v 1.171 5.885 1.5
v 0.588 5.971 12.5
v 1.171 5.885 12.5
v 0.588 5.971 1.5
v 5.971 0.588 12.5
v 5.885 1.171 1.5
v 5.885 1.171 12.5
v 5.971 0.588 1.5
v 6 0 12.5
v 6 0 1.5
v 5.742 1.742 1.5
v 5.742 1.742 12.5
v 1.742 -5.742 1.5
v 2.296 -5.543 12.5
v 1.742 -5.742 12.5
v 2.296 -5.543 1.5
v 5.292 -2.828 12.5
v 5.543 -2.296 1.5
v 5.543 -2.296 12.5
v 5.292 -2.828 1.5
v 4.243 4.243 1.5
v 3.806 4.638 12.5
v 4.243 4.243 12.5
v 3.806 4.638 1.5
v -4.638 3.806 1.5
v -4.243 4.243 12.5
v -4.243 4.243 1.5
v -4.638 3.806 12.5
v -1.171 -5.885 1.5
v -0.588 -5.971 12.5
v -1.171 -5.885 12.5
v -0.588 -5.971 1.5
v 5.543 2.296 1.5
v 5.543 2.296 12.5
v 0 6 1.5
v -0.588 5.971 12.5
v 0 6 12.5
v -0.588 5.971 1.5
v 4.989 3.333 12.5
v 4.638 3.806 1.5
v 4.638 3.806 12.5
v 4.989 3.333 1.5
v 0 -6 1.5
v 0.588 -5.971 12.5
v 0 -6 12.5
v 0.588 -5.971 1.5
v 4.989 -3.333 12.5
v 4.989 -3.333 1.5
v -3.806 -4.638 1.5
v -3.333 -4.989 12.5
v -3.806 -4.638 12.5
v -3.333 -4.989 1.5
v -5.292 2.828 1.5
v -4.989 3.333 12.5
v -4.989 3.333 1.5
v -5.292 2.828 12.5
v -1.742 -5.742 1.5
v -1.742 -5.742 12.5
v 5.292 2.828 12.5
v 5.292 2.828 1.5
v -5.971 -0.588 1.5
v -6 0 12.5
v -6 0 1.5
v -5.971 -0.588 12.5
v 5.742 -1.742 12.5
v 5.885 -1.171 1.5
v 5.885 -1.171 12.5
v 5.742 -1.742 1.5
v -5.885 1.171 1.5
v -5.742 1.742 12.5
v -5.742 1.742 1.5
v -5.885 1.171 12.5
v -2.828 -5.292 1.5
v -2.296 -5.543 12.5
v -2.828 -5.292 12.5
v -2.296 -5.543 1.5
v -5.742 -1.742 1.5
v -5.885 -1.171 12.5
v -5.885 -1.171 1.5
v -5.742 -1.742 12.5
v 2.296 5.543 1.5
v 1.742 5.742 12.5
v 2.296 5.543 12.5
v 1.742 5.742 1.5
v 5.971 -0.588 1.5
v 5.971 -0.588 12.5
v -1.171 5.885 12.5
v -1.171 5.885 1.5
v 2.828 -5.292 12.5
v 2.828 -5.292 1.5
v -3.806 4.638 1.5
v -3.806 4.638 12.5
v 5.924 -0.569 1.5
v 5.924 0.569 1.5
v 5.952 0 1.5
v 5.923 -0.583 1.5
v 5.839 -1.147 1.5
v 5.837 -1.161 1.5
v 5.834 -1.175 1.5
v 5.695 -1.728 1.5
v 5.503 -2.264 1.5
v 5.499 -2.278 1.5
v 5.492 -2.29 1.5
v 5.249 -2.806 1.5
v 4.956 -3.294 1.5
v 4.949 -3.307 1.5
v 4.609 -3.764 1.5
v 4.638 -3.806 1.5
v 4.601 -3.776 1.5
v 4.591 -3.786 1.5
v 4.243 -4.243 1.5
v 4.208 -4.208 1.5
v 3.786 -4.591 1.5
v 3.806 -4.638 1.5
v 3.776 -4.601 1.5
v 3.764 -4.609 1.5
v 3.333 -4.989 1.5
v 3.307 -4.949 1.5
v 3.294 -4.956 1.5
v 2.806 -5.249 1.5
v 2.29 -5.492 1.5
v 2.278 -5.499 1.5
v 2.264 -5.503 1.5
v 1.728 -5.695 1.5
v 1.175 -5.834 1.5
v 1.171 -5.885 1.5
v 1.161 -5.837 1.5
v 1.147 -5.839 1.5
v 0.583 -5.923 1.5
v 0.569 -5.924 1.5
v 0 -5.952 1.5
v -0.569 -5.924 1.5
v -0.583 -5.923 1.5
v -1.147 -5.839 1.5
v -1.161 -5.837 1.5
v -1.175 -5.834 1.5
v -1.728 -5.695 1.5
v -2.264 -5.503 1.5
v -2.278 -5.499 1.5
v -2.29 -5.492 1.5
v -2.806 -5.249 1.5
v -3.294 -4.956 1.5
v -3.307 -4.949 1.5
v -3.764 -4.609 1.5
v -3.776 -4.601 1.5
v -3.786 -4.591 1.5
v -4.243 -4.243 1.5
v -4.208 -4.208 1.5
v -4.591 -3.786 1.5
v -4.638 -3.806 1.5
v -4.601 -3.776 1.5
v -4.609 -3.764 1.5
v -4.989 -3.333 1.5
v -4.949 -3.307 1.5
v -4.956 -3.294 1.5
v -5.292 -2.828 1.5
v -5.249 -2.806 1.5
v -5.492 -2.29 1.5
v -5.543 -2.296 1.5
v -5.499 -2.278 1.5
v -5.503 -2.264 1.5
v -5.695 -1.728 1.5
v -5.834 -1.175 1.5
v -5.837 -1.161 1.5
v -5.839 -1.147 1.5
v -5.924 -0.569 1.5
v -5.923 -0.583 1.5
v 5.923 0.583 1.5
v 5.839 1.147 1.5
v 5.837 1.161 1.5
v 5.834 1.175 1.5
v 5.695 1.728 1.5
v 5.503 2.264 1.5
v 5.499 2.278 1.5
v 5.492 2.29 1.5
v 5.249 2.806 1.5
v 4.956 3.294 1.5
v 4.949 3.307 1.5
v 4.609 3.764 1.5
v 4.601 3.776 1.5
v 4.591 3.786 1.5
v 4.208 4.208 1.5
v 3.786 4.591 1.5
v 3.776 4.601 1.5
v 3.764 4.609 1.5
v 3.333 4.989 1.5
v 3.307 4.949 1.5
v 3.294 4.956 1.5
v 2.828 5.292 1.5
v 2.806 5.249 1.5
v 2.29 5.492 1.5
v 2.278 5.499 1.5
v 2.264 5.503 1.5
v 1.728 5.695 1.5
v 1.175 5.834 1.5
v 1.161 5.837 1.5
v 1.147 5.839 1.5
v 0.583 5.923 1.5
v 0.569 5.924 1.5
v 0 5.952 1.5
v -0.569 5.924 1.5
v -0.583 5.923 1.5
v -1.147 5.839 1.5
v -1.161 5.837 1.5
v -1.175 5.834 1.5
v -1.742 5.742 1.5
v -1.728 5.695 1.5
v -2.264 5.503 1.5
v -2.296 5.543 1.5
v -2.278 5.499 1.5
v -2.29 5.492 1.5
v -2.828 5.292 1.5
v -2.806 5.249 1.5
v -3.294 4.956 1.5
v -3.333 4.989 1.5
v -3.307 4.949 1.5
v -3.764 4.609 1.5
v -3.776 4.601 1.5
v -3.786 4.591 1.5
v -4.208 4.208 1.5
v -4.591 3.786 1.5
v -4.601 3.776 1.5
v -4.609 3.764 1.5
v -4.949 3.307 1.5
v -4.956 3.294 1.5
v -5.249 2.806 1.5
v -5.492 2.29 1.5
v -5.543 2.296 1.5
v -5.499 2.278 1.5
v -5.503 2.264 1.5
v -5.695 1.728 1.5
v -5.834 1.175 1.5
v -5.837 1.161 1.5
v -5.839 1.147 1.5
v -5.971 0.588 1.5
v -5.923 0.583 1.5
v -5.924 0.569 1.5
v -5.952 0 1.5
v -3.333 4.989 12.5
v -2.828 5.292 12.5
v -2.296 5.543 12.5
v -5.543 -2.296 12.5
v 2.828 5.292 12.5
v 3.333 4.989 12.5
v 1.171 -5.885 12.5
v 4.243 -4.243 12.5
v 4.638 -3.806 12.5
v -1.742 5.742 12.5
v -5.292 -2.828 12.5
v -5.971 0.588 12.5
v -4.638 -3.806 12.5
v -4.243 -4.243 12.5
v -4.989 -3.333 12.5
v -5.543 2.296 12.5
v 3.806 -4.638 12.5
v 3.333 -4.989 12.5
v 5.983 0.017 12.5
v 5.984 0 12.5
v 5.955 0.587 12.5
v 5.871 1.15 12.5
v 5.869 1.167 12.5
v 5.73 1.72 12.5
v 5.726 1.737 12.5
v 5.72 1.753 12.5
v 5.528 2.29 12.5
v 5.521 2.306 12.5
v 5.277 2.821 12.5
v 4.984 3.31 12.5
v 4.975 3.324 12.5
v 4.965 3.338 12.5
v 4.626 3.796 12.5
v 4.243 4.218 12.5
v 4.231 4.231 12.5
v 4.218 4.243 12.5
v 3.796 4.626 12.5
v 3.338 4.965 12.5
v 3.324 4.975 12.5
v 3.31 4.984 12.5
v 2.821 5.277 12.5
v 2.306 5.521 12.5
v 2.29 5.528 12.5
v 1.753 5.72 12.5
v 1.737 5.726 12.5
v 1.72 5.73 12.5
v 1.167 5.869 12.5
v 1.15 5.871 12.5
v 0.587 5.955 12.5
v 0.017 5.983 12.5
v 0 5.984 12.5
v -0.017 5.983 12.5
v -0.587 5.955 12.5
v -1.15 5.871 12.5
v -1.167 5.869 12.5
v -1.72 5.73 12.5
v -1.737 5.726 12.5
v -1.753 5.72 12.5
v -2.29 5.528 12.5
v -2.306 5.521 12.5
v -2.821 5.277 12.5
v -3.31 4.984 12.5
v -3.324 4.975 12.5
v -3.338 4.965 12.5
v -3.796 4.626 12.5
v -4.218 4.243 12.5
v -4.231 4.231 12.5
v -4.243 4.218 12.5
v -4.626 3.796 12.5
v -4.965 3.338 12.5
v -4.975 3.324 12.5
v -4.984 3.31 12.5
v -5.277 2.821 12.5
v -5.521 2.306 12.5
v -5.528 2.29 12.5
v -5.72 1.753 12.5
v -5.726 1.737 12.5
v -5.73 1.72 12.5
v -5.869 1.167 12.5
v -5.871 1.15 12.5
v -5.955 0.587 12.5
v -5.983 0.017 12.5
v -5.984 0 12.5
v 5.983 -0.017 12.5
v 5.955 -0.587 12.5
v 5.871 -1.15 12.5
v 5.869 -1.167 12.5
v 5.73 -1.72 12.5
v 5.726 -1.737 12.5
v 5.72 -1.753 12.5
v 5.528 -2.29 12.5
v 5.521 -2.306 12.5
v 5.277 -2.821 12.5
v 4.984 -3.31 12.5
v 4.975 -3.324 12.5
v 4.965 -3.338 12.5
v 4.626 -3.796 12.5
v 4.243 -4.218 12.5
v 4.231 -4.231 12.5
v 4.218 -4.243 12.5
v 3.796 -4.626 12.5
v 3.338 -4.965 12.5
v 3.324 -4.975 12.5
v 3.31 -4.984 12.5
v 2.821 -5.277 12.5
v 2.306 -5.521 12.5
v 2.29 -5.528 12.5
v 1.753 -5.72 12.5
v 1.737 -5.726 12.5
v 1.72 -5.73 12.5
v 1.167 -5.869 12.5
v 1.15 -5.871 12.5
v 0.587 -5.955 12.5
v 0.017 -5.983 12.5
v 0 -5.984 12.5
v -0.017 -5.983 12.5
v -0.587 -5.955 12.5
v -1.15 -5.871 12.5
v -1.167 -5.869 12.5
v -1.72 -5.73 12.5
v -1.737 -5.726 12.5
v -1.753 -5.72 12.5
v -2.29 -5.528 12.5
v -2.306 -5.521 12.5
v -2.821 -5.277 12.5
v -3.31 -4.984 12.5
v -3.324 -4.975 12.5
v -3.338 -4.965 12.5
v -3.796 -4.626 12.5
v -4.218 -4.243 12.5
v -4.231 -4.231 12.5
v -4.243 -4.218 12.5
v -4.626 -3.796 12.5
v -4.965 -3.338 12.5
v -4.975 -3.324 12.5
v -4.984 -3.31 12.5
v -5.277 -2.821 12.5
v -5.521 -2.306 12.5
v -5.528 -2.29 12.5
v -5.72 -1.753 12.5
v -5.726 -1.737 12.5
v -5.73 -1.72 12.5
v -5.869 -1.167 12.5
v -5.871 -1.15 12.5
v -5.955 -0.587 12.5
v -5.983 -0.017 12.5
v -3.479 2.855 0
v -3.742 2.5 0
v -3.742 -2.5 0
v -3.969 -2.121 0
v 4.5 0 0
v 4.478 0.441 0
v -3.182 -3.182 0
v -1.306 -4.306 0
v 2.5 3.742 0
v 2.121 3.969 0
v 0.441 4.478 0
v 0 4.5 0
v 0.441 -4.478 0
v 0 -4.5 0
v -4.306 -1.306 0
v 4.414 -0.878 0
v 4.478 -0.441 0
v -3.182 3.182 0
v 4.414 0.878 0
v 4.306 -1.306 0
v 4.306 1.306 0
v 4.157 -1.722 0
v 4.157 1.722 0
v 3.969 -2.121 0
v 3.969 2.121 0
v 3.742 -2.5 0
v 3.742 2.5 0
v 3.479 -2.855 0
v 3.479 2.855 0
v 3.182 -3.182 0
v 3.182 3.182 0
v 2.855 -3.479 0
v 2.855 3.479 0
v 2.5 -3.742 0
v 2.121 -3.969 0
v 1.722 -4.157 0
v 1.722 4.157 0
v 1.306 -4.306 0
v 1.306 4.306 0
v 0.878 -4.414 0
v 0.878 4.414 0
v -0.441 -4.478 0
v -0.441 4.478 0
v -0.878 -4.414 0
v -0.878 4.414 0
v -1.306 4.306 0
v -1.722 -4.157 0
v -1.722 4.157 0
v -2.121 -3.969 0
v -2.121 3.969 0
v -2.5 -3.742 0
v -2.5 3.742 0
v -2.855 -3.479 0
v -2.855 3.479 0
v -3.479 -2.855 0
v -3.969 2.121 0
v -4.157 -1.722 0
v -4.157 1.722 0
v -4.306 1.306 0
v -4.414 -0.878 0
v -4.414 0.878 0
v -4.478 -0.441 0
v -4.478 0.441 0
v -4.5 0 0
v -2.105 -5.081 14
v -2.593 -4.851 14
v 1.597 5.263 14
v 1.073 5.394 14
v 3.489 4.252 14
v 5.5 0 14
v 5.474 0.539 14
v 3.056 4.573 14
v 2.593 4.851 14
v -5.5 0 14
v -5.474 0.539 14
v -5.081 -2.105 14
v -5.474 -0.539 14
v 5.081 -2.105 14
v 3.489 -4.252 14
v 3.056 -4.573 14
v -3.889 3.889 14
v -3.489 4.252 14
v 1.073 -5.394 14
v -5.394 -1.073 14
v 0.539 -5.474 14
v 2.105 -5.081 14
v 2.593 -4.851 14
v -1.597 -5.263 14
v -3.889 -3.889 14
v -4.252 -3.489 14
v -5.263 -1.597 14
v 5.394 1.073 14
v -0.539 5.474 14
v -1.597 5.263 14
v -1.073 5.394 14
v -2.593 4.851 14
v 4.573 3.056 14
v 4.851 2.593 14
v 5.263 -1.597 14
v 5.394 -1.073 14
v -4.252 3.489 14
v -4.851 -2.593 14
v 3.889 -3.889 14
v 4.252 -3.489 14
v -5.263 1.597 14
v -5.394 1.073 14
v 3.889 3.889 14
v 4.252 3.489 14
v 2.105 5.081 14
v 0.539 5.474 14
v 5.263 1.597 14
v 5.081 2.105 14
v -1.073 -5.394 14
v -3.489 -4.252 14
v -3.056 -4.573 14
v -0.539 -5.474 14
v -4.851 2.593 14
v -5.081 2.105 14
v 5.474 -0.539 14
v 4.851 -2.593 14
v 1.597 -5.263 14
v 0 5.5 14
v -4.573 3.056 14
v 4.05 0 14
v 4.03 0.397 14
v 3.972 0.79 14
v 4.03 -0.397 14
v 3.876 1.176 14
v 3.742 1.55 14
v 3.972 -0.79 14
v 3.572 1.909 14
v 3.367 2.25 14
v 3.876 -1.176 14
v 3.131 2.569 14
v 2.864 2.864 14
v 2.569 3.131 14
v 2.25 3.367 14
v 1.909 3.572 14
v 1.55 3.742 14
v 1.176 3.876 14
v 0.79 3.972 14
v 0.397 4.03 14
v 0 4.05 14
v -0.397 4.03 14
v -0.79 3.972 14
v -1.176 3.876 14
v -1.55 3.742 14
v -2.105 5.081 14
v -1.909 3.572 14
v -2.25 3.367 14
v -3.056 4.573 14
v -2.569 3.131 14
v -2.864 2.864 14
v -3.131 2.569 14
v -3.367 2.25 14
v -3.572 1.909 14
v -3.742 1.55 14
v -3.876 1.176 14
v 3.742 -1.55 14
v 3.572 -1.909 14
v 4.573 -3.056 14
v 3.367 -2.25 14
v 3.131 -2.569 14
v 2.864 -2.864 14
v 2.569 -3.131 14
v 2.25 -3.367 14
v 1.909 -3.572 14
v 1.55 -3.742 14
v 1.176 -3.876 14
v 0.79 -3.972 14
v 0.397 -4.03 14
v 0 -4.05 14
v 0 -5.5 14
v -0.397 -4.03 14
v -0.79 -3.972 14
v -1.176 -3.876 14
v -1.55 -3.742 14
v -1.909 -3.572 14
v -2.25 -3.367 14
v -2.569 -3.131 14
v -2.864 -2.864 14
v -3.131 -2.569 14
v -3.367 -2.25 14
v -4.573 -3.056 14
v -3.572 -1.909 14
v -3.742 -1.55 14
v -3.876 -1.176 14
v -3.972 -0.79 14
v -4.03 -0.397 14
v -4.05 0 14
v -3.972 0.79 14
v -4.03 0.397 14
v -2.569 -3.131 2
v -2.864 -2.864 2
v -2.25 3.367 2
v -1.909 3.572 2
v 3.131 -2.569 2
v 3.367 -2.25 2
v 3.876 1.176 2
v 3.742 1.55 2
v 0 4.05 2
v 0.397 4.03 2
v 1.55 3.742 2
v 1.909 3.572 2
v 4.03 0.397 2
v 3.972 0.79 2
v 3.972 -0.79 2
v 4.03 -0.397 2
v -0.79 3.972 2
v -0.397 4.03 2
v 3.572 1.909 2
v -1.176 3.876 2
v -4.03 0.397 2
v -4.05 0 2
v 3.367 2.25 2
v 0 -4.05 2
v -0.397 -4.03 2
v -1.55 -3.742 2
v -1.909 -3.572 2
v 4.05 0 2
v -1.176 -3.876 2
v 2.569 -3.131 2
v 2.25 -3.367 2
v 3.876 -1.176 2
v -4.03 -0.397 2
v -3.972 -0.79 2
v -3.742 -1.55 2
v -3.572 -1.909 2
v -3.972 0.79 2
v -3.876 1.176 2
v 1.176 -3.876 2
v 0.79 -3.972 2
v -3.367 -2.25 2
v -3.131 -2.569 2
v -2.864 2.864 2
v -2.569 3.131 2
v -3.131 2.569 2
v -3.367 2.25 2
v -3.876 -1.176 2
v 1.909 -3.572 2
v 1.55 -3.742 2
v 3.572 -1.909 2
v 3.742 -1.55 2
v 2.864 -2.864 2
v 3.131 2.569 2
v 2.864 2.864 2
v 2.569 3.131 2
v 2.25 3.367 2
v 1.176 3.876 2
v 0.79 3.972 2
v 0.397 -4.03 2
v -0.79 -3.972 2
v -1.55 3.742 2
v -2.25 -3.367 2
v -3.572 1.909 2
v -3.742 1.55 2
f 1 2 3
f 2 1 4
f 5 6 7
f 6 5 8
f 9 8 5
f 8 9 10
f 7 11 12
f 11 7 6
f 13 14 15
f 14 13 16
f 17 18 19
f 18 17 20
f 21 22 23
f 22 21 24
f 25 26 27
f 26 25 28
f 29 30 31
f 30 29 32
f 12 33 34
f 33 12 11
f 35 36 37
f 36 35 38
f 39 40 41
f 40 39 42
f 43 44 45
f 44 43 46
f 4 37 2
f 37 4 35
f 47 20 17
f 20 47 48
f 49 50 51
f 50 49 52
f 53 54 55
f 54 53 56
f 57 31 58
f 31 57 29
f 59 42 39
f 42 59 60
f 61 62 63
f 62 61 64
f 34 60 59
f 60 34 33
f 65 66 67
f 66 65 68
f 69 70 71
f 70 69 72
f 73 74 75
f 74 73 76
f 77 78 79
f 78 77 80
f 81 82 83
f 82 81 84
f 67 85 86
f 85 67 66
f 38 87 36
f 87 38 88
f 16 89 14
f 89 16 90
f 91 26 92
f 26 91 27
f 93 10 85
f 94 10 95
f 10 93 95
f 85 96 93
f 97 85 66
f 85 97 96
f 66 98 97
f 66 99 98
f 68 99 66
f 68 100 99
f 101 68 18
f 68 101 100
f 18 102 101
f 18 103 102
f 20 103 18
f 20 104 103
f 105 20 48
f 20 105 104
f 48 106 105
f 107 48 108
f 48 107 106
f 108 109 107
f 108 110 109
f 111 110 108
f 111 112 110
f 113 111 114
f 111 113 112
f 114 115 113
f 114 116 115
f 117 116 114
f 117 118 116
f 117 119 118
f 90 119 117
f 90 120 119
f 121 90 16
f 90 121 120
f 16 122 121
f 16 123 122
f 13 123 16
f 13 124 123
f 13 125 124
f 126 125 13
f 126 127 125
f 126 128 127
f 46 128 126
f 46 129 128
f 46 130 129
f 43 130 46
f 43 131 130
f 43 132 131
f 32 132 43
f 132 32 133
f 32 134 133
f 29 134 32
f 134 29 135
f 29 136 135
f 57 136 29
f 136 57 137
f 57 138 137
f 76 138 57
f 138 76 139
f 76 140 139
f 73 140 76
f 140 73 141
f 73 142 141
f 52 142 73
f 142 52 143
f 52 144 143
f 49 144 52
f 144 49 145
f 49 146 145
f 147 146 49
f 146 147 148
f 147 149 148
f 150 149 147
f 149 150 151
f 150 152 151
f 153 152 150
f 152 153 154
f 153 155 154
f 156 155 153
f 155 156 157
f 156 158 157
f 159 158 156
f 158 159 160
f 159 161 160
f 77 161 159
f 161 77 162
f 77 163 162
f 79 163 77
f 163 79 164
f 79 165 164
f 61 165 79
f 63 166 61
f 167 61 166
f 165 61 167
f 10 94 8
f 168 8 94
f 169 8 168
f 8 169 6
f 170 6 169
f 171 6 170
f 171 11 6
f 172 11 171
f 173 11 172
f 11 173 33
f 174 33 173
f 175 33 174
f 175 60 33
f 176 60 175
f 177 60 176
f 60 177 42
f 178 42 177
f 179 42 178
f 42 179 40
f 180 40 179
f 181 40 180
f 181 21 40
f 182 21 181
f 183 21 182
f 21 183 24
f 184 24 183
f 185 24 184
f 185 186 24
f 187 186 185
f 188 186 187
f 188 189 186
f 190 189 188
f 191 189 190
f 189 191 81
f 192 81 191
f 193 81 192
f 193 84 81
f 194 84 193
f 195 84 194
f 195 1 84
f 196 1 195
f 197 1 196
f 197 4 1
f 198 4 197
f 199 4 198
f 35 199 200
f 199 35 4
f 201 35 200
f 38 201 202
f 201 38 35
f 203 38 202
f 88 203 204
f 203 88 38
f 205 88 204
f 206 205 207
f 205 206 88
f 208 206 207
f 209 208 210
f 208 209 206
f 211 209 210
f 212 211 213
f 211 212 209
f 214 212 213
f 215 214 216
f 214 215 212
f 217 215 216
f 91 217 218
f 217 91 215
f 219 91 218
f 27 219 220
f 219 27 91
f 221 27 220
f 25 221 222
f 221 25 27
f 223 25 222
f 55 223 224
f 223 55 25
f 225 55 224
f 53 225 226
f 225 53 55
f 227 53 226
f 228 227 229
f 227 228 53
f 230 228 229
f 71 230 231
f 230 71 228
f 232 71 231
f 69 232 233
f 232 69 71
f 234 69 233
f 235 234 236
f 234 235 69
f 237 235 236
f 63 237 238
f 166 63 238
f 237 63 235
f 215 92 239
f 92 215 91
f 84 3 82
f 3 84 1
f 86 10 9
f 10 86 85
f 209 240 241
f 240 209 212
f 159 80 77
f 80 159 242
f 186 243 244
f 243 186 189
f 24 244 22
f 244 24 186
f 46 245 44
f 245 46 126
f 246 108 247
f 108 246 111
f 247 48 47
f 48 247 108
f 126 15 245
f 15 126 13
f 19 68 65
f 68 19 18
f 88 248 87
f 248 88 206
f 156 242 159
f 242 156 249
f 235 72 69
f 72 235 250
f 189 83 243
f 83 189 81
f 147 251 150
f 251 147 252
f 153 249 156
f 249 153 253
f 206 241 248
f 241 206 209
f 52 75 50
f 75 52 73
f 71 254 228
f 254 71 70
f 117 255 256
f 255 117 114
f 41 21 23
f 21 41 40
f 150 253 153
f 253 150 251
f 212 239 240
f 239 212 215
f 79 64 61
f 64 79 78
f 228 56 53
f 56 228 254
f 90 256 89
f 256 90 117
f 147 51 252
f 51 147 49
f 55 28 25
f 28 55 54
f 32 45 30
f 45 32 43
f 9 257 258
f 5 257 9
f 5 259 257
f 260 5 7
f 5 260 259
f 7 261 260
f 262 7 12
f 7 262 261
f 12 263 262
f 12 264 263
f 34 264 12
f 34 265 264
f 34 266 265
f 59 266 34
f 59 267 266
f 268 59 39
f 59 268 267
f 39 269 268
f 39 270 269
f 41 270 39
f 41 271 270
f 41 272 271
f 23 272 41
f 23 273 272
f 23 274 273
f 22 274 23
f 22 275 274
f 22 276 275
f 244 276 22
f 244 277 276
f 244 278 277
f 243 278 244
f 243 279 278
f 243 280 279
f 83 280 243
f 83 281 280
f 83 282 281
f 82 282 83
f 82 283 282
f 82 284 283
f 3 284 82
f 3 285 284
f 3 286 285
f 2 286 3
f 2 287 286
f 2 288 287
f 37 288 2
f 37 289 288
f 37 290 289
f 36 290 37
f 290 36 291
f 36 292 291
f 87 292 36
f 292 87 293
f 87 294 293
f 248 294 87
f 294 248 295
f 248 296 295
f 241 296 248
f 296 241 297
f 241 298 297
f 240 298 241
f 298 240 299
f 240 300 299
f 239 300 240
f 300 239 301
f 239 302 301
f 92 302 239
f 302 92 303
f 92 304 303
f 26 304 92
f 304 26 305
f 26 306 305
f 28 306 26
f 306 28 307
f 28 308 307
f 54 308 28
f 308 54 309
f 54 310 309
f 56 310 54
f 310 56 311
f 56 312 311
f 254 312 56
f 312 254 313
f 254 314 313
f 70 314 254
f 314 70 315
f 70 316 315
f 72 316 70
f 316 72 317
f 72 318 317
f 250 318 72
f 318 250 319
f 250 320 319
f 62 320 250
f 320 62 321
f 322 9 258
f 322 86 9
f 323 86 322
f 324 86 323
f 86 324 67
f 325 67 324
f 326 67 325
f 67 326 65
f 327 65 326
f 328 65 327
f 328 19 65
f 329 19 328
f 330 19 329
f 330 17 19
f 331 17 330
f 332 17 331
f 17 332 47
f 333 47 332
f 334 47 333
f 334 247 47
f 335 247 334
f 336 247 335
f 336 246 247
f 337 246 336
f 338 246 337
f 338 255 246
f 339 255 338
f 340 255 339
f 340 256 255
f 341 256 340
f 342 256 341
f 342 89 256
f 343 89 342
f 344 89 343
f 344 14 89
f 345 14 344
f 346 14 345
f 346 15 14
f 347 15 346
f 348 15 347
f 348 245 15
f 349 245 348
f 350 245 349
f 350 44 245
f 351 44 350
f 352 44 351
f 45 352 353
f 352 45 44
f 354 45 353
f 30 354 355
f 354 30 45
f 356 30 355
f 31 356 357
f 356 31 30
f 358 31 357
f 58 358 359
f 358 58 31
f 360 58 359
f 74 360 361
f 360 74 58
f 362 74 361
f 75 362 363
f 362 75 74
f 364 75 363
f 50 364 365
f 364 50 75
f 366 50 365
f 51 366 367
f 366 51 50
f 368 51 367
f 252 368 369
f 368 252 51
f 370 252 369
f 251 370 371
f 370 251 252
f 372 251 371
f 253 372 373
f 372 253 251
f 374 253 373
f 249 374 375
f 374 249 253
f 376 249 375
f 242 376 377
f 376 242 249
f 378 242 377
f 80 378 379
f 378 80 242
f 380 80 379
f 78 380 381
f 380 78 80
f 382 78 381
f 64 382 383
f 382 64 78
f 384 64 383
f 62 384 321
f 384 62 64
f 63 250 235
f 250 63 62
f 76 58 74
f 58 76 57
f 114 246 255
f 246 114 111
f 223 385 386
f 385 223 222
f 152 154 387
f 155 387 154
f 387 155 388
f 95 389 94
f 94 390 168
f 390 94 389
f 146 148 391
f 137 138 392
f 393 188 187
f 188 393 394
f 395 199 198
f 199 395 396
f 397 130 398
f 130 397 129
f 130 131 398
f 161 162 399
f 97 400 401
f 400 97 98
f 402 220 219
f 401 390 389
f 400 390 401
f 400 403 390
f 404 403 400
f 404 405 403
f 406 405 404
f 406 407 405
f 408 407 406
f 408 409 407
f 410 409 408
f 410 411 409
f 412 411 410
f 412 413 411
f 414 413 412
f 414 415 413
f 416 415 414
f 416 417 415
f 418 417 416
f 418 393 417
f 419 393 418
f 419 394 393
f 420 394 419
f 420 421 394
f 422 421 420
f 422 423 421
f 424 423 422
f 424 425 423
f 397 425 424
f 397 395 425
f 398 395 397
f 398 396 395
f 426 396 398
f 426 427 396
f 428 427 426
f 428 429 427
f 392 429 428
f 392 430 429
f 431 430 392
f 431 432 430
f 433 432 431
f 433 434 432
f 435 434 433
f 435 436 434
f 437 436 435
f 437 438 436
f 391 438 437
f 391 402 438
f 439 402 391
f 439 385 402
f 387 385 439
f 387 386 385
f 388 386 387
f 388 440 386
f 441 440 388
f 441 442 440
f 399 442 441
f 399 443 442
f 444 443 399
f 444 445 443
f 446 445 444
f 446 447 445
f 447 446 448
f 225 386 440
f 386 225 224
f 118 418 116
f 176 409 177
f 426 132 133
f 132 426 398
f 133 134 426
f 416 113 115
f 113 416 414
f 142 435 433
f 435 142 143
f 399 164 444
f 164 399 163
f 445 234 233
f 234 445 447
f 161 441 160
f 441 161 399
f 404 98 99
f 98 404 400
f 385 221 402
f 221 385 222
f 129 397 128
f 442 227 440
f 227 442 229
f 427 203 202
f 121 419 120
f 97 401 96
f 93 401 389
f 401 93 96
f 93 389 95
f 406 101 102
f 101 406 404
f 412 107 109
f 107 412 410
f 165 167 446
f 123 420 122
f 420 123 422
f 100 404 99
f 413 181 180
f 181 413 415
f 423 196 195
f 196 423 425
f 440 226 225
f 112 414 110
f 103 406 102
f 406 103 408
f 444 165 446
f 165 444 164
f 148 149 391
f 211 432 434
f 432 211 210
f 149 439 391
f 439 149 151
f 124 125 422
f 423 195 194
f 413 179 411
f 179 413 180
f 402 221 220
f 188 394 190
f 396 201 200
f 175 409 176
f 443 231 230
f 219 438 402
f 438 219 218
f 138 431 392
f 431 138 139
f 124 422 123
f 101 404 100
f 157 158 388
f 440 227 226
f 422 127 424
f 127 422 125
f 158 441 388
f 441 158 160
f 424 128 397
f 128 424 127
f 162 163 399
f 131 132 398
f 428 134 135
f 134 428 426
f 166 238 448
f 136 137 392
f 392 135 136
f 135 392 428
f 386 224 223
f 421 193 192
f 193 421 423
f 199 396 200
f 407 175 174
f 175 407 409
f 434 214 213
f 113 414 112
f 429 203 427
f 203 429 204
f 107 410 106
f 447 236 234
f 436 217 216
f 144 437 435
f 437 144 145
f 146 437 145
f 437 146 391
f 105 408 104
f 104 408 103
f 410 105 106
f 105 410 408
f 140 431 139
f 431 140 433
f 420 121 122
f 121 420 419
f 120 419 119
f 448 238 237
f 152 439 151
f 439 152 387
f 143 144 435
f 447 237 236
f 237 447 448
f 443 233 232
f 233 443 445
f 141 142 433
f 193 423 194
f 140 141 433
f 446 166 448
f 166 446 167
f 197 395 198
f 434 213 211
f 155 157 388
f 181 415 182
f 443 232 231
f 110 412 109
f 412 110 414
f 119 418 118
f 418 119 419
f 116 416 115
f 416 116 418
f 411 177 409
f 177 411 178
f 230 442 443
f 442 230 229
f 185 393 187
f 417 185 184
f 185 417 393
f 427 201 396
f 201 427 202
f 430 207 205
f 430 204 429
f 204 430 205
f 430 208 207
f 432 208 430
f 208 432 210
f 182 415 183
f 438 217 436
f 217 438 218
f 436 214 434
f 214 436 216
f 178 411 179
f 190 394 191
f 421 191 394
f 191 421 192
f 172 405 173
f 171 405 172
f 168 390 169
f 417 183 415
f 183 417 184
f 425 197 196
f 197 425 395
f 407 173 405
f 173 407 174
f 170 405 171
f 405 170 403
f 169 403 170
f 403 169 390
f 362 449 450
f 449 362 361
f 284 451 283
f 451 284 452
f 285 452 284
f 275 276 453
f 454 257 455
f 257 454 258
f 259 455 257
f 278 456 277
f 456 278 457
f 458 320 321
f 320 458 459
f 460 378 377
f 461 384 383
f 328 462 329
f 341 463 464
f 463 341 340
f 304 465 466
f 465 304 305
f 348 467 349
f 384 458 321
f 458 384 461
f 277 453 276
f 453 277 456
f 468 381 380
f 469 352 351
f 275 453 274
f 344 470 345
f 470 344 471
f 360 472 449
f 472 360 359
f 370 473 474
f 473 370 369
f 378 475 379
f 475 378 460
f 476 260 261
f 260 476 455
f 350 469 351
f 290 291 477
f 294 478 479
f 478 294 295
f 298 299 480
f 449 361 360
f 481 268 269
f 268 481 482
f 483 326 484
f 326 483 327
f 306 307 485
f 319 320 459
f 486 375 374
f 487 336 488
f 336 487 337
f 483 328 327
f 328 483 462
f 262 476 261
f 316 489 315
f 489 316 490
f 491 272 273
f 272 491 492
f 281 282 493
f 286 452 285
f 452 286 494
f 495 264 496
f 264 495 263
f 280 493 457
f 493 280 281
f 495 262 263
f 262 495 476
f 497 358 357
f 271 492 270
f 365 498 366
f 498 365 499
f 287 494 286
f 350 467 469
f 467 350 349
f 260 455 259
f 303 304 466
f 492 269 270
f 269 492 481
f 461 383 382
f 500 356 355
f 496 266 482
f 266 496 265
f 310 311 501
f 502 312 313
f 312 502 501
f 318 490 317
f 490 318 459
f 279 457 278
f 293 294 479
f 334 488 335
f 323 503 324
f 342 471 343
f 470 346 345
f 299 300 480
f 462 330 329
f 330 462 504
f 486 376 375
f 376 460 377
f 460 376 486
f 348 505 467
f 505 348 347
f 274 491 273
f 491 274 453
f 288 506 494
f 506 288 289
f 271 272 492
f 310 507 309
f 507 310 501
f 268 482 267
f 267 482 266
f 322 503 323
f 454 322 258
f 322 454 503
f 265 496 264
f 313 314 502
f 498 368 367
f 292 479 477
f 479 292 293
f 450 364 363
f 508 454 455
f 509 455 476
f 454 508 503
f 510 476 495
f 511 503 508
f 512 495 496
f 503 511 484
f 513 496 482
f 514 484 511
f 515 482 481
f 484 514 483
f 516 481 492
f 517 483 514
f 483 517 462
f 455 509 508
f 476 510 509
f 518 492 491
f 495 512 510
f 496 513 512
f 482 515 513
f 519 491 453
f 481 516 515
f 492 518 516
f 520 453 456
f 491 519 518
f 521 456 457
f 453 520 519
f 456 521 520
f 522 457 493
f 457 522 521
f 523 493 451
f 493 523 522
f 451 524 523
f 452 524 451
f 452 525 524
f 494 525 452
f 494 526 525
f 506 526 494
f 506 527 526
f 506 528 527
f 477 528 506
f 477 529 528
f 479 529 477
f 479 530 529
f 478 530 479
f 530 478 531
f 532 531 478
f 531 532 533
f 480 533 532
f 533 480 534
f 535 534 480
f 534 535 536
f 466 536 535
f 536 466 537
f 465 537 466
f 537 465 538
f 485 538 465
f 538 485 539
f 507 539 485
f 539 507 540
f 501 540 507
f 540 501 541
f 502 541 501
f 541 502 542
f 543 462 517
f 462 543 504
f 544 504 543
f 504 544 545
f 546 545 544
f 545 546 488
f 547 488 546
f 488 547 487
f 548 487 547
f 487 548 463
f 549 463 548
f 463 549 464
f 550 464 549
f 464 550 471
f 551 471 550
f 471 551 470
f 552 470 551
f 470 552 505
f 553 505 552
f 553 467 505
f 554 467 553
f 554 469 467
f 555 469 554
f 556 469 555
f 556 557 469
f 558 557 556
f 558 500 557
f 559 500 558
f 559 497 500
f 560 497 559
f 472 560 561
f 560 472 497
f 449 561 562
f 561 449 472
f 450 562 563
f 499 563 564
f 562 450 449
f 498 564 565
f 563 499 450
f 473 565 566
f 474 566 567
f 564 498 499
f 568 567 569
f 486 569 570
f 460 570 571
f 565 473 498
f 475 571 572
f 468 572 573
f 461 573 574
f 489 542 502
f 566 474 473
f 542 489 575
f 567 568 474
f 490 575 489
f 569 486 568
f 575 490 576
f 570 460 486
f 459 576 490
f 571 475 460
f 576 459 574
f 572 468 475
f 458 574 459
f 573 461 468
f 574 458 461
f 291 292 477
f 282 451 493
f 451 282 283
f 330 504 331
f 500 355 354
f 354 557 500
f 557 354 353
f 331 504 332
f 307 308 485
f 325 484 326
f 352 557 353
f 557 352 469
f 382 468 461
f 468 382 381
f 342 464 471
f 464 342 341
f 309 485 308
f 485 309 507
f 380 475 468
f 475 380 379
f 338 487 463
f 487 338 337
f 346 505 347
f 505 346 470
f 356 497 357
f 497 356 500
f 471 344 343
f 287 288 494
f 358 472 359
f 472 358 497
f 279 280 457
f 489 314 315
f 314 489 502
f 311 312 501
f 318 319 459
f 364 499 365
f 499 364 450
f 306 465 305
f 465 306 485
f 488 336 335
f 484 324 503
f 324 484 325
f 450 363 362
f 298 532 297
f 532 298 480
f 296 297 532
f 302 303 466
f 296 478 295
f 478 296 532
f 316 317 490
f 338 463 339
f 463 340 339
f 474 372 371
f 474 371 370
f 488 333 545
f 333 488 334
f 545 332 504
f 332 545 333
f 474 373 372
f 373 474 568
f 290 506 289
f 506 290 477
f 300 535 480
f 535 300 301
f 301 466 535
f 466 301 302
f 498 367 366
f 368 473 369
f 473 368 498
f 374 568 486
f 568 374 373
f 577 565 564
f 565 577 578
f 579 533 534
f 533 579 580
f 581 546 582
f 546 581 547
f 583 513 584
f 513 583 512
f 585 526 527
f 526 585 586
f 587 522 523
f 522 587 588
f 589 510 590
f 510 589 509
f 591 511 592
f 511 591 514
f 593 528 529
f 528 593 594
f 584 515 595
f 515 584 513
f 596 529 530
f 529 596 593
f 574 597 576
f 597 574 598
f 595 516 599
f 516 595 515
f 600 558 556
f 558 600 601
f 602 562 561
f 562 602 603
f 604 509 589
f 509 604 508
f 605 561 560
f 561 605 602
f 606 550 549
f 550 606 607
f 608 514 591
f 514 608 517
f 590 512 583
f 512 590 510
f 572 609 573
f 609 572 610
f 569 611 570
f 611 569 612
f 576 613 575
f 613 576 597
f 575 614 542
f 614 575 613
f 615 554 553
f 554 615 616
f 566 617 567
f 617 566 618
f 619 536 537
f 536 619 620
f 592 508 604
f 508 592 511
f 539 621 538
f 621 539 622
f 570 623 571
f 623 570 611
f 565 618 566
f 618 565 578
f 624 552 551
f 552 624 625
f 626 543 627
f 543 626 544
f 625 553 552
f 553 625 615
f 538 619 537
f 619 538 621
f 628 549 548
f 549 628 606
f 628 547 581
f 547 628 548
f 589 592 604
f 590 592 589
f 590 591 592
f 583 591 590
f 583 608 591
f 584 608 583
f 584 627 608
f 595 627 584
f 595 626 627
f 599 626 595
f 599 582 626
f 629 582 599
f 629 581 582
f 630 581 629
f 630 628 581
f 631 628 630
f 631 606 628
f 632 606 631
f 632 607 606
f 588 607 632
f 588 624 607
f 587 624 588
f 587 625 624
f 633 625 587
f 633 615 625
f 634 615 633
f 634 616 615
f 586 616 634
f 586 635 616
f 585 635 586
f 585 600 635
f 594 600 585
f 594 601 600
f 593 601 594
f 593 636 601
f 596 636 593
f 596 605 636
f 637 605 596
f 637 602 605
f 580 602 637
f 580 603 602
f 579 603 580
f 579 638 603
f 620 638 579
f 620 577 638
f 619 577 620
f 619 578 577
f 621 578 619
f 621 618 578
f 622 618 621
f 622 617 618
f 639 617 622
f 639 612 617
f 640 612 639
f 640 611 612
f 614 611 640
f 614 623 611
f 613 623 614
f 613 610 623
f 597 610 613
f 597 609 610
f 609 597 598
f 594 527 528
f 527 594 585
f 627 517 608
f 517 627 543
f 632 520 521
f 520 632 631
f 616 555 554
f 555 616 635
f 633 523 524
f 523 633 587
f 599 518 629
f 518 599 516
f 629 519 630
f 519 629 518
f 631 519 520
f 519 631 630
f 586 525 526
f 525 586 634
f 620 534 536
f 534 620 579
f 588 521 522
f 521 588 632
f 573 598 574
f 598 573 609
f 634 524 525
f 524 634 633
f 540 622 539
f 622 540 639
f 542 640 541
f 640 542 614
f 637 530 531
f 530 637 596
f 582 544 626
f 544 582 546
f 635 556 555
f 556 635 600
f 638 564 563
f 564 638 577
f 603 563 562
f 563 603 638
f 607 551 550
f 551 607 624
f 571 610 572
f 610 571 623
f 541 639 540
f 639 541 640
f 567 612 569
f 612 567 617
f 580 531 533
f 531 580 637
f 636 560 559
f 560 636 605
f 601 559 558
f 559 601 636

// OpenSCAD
$fn=64;

chamfer = 1.5;

od = 12;
id = 8.1;
l = 14;

eps=0.05;
base = 2;


difference() {
  union() {
  translate([0, 0, chamfer]) cylinder(d=od, h=l-2*chamfer);
    cylinder(d1=od-2*chamfer, d2=od, h=chamfer+eps);  
    
    translate([0, 0, l-chamfer-eps]) cylinder(d1=od, d2=14-2*chamfer, h=chamfer+eps);  

  }
  
  translate([0, 0, base]) cylinder(d=id,h=l);
}
